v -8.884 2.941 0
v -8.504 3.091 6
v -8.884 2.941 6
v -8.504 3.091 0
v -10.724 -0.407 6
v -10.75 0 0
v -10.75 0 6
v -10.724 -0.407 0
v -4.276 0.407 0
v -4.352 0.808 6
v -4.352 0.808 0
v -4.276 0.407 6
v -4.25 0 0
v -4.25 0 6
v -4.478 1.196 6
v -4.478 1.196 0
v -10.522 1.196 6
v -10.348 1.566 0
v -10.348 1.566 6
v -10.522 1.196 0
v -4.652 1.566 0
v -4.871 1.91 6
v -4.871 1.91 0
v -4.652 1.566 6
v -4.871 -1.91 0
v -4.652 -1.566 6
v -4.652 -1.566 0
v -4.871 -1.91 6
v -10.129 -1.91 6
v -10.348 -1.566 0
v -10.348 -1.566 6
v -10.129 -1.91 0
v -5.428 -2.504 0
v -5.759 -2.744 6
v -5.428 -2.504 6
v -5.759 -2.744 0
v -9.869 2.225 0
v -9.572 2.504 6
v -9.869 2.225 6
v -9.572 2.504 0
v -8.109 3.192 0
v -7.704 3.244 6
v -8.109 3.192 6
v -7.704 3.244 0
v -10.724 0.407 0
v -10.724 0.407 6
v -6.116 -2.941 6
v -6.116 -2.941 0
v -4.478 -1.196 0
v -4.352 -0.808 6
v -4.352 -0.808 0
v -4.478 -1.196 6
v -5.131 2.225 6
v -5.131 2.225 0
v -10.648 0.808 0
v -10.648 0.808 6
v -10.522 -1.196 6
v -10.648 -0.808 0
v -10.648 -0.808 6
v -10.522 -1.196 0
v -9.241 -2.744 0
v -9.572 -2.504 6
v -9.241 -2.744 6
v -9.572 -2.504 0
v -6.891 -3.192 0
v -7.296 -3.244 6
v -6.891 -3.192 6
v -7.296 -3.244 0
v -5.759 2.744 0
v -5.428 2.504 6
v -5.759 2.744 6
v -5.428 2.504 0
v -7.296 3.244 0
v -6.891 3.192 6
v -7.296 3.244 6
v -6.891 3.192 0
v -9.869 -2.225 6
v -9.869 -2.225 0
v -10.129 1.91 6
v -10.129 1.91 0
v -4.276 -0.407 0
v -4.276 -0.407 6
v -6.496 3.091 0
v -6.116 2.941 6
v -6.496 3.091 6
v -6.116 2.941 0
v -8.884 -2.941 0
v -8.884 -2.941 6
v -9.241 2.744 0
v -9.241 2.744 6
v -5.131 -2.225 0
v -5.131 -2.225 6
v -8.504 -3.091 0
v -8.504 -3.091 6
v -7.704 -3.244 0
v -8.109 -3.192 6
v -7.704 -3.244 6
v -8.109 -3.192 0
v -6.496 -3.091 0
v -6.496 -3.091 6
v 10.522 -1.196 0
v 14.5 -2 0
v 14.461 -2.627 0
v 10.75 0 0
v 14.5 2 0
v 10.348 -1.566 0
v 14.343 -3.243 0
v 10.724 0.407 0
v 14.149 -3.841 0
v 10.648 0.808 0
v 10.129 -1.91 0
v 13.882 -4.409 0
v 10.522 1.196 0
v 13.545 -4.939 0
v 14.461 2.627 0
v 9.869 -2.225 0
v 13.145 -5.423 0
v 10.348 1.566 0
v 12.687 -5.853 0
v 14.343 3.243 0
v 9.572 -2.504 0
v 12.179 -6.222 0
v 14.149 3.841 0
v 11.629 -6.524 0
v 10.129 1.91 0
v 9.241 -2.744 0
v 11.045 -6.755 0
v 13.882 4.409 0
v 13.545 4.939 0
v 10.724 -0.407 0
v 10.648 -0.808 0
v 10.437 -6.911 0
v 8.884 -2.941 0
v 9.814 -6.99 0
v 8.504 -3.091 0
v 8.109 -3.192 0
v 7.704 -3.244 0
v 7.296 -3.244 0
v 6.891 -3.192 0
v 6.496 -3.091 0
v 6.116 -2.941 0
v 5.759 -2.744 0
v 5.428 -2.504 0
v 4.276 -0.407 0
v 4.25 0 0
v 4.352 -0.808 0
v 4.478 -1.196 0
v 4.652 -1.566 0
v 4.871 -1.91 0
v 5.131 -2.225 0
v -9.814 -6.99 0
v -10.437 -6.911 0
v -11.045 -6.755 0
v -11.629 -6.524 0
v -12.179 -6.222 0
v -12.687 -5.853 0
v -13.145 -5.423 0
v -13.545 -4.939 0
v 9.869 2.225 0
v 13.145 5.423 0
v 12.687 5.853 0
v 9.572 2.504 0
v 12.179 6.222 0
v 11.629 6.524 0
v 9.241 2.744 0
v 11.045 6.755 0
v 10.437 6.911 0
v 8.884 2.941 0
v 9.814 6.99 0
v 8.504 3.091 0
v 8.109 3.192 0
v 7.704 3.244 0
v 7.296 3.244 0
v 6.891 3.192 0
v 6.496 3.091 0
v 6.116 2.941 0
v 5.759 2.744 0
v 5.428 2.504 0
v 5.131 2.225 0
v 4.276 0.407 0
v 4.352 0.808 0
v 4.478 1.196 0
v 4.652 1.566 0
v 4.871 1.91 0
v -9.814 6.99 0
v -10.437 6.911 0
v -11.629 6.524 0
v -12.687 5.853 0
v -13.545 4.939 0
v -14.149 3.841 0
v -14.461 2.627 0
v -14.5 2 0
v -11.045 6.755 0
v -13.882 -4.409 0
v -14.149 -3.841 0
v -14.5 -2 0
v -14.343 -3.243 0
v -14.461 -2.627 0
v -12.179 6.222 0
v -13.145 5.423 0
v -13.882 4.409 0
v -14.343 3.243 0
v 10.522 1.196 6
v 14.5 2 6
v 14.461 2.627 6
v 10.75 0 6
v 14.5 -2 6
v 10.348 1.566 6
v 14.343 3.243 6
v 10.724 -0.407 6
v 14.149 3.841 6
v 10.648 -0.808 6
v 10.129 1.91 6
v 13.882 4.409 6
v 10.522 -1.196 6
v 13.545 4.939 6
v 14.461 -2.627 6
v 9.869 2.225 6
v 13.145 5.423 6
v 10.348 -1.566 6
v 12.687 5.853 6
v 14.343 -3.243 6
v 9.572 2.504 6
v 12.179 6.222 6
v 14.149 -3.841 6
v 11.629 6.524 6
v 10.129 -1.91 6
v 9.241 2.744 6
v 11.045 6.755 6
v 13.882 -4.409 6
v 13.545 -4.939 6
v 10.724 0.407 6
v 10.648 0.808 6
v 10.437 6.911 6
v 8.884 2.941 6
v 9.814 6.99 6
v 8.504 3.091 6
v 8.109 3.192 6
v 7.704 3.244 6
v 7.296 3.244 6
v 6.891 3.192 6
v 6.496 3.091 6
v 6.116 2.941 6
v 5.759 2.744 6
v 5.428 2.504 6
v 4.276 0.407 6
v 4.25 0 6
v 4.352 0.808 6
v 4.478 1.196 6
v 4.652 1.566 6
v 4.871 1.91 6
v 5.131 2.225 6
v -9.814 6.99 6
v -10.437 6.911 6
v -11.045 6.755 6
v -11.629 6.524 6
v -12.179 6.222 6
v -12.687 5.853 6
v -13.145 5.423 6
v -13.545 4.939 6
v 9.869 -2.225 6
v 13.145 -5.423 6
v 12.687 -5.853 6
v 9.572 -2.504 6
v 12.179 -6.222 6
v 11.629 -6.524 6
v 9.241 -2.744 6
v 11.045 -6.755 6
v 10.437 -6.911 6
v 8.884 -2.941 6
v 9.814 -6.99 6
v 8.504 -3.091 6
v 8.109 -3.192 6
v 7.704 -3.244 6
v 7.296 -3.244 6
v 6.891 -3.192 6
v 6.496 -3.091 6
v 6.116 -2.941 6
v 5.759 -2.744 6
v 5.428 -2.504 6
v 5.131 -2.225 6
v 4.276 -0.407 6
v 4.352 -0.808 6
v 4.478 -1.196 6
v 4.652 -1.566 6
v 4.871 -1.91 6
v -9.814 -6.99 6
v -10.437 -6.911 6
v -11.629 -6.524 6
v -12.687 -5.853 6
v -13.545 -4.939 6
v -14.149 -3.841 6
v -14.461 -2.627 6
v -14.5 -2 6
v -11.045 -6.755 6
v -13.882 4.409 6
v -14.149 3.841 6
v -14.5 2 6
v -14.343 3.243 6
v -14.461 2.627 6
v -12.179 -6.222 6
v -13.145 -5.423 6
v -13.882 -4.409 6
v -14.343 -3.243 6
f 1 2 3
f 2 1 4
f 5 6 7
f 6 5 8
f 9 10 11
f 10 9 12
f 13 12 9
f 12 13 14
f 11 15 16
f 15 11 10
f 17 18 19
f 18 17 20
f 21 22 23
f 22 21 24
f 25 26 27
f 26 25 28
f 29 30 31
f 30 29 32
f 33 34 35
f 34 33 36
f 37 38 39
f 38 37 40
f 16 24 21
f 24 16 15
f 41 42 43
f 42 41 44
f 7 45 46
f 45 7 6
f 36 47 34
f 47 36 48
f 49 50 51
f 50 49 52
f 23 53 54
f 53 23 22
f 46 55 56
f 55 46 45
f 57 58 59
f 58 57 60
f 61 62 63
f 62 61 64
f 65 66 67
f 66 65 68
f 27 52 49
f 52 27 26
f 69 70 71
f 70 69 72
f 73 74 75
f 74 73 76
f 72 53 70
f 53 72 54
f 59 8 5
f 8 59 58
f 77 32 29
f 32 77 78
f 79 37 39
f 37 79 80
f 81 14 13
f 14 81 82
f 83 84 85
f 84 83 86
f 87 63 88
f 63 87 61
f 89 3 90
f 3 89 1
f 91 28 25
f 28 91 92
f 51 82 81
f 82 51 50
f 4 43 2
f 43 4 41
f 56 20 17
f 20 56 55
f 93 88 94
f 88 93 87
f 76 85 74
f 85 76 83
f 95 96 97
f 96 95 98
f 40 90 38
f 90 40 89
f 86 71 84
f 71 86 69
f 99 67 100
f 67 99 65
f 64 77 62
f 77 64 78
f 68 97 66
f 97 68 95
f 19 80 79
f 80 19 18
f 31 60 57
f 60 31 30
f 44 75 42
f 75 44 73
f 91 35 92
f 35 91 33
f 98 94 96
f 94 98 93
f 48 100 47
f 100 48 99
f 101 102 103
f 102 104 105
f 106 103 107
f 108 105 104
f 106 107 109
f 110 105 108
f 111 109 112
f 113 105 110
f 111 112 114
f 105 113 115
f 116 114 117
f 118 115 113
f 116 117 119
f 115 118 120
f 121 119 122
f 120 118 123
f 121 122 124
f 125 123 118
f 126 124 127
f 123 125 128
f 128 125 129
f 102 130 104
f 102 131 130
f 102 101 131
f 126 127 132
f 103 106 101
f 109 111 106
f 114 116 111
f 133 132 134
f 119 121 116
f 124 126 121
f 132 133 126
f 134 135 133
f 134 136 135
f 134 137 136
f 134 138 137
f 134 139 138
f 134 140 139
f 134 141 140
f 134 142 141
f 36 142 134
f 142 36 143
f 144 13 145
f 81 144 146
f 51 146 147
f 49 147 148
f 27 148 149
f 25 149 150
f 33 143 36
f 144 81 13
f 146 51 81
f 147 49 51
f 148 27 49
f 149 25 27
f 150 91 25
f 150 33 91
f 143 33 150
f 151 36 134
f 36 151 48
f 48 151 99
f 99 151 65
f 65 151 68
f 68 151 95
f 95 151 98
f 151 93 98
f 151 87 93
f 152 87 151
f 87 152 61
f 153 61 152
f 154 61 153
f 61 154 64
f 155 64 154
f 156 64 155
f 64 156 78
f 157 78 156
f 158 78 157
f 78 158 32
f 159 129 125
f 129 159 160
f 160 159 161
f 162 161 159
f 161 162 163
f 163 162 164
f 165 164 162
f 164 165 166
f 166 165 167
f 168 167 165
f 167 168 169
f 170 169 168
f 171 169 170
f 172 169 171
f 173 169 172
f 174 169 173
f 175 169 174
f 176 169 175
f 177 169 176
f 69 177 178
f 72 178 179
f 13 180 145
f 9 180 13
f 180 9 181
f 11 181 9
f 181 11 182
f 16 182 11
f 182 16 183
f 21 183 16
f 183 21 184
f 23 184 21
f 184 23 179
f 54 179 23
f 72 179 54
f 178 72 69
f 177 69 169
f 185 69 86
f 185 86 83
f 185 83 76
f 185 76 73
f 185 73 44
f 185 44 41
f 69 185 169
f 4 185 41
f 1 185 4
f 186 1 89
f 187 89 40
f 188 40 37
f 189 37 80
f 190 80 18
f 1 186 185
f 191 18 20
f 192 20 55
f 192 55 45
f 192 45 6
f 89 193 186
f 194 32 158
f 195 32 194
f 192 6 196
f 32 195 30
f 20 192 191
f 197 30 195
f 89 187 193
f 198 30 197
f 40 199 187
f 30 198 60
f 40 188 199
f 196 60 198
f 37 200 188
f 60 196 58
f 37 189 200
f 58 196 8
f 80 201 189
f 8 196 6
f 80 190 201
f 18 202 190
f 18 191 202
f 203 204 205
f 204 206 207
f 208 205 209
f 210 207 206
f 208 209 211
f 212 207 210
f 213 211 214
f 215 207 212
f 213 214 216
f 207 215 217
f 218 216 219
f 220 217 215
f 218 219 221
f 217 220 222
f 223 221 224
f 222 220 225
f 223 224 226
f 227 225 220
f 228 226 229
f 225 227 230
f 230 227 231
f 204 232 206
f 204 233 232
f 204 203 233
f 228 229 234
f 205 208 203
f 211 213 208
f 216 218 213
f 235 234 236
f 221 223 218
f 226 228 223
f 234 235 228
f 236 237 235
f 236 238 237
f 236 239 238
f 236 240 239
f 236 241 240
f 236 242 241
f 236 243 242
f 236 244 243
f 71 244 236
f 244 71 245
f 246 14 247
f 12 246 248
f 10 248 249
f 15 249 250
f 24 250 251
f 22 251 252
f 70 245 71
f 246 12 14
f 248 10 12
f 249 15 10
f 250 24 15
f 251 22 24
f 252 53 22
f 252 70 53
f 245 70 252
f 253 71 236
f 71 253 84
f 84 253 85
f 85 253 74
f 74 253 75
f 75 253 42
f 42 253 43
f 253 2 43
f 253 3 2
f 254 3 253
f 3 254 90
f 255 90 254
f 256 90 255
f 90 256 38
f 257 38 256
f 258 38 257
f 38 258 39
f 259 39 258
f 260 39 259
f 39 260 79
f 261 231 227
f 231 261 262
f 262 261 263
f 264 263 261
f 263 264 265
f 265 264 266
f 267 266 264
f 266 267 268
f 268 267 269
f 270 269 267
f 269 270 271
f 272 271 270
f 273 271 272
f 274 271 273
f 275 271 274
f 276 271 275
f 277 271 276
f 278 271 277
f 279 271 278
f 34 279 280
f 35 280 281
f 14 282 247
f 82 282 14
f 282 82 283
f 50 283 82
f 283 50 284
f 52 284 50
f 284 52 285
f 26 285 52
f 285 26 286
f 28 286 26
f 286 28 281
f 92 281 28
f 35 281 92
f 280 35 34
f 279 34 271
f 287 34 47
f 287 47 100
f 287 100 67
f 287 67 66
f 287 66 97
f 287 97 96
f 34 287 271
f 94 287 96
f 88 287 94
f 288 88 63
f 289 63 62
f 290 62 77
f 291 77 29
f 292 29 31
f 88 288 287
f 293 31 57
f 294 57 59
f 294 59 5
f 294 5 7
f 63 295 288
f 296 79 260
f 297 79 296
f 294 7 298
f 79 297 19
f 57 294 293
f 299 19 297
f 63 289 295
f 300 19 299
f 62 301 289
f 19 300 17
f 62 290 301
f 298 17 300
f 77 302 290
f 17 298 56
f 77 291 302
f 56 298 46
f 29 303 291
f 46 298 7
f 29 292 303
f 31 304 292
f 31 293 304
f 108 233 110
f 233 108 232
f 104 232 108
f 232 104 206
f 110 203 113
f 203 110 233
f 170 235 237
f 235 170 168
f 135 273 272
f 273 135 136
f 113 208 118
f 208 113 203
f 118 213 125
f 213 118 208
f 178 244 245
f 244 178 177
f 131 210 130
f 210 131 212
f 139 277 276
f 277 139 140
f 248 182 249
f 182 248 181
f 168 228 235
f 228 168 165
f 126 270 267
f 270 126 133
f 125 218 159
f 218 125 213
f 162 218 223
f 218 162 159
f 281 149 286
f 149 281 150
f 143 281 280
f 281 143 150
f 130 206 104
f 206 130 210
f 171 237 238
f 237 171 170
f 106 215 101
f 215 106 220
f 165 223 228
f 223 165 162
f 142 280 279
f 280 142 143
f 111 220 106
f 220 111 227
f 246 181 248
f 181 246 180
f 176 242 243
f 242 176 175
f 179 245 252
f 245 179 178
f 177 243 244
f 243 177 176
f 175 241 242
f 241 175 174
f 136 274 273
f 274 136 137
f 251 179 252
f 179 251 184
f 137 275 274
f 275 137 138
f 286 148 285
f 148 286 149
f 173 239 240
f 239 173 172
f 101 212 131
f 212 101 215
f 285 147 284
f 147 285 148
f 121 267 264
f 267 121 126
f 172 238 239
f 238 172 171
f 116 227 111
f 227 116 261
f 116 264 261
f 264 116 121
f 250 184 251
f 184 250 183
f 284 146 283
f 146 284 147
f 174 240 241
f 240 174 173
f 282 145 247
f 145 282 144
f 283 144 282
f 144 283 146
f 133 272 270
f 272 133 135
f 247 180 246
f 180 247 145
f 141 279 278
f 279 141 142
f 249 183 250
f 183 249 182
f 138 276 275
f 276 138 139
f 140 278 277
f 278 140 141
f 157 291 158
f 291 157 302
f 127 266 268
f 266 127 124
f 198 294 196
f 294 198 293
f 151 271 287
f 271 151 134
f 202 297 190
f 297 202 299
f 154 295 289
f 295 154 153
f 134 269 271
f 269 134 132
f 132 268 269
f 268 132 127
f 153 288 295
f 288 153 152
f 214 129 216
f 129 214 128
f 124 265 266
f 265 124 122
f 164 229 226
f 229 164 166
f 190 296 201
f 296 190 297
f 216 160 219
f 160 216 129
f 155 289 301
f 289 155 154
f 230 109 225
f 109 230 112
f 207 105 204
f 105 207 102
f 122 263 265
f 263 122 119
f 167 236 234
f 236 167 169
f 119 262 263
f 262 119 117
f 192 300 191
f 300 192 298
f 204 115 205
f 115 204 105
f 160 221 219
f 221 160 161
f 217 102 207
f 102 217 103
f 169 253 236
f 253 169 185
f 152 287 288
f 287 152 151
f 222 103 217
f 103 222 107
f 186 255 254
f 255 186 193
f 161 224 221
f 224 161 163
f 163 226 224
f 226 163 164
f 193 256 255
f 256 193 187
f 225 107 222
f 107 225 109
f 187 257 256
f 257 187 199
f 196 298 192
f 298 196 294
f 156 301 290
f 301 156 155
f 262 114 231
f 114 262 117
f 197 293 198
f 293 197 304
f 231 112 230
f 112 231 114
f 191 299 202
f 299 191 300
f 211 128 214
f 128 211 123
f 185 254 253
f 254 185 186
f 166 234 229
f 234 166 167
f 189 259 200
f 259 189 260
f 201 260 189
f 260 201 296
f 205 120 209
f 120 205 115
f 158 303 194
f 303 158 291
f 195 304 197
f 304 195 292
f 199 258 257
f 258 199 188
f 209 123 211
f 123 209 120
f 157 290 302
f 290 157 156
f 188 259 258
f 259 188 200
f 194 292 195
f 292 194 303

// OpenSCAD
$fn = 50;


difference() {
	union() {
		hull() {
			translate(v = [-9.5000000000, 2.0000000000, 0]) {
				cylinder(h = 6, r = 5);
			}
			translate(v = [9.5000000000, 2.0000000000, 0]) {
				cylinder(h = 6, r = 5);
			}
			translate(v = [-9.5000000000, -2.0000000000, 0]) {
				cylinder(h = 6, r = 5);
			}
			translate(v = [9.5000000000, -2.0000000000, 0]) {
				cylinder(h = 6, r = 5);
			}
		}
	}
	union() {
		translate(v = [-7.5000000000, 0.0000000000, 0]) {
			cylinder(h = 6, r = 3.2500000000);
		}
		translate(v = [7.5000000000, 0.0000000000, 0]) {
			cylinder(h = 6, r = 3.2500000000);
		}
		translate(v = [-7.5000000000, 0.0000000000, 0]) {
			cylinder(h = 6, r = 1.8000000000);
		}
		translate(v = [7.5000000000, 0.0000000000, 0]) {
			cylinder(h = 6, r = 1.8000000000);
		}
		translate(v = [-7.5000000000, 0.0000000000, 0]) {
			cylinder(h = 6, r = 1.8000000000);
		}
		translate(v = [7.5000000000, 0.0000000000, 0]) {
			cylinder(h = 6, r = 1.8000000000);
		}
		translate(v = [-7.5000000000, 0.0000000000, 0]) {
			cylinder(h = 6, r = 1.8000000000);
		}
		translate(v = [7.5000000000, 0.0000000000, 0]) {
			cylinder(h = 6, r = 1.8000000000);
		}
	}
}
